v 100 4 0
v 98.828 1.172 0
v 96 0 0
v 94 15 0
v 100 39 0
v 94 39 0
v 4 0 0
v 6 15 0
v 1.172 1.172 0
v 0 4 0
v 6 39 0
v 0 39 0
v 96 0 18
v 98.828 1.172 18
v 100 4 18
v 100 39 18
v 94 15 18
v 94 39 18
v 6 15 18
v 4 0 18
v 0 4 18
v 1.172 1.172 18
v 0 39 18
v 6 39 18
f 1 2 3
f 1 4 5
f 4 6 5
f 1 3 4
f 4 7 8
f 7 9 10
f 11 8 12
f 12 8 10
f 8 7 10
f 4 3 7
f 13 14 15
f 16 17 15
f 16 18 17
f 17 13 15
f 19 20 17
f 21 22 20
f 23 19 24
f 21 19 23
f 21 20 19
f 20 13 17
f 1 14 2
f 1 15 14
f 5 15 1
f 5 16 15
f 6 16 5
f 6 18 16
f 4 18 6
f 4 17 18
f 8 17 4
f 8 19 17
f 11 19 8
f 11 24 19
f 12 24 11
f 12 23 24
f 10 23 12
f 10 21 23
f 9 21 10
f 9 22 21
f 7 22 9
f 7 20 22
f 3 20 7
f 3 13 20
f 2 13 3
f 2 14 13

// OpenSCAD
$fn = 32;

// ----------------------------------------------------------------------
// Heat sink frame: 100 x 39 mm frame, 6 mm walls
// ----------------------------------------------------------------------

// --- parameters (mm) ---
profile_height = 18;      // extrusion height
profile_points = 12;      // points of the closed outline

profile = [[0, 4], [1.172, 1.172], [4, 0], [96, 0], [98.828, 1.172], [100, 4], [100, 39], [94, 39], [94, 15], [6, 15], [6, 39], [0, 39]];  // single closed polygon, 12 points, counter clockwise

// --- the one profile operation ---
linear_extrude(height = profile_height) polygon(points = profile);
